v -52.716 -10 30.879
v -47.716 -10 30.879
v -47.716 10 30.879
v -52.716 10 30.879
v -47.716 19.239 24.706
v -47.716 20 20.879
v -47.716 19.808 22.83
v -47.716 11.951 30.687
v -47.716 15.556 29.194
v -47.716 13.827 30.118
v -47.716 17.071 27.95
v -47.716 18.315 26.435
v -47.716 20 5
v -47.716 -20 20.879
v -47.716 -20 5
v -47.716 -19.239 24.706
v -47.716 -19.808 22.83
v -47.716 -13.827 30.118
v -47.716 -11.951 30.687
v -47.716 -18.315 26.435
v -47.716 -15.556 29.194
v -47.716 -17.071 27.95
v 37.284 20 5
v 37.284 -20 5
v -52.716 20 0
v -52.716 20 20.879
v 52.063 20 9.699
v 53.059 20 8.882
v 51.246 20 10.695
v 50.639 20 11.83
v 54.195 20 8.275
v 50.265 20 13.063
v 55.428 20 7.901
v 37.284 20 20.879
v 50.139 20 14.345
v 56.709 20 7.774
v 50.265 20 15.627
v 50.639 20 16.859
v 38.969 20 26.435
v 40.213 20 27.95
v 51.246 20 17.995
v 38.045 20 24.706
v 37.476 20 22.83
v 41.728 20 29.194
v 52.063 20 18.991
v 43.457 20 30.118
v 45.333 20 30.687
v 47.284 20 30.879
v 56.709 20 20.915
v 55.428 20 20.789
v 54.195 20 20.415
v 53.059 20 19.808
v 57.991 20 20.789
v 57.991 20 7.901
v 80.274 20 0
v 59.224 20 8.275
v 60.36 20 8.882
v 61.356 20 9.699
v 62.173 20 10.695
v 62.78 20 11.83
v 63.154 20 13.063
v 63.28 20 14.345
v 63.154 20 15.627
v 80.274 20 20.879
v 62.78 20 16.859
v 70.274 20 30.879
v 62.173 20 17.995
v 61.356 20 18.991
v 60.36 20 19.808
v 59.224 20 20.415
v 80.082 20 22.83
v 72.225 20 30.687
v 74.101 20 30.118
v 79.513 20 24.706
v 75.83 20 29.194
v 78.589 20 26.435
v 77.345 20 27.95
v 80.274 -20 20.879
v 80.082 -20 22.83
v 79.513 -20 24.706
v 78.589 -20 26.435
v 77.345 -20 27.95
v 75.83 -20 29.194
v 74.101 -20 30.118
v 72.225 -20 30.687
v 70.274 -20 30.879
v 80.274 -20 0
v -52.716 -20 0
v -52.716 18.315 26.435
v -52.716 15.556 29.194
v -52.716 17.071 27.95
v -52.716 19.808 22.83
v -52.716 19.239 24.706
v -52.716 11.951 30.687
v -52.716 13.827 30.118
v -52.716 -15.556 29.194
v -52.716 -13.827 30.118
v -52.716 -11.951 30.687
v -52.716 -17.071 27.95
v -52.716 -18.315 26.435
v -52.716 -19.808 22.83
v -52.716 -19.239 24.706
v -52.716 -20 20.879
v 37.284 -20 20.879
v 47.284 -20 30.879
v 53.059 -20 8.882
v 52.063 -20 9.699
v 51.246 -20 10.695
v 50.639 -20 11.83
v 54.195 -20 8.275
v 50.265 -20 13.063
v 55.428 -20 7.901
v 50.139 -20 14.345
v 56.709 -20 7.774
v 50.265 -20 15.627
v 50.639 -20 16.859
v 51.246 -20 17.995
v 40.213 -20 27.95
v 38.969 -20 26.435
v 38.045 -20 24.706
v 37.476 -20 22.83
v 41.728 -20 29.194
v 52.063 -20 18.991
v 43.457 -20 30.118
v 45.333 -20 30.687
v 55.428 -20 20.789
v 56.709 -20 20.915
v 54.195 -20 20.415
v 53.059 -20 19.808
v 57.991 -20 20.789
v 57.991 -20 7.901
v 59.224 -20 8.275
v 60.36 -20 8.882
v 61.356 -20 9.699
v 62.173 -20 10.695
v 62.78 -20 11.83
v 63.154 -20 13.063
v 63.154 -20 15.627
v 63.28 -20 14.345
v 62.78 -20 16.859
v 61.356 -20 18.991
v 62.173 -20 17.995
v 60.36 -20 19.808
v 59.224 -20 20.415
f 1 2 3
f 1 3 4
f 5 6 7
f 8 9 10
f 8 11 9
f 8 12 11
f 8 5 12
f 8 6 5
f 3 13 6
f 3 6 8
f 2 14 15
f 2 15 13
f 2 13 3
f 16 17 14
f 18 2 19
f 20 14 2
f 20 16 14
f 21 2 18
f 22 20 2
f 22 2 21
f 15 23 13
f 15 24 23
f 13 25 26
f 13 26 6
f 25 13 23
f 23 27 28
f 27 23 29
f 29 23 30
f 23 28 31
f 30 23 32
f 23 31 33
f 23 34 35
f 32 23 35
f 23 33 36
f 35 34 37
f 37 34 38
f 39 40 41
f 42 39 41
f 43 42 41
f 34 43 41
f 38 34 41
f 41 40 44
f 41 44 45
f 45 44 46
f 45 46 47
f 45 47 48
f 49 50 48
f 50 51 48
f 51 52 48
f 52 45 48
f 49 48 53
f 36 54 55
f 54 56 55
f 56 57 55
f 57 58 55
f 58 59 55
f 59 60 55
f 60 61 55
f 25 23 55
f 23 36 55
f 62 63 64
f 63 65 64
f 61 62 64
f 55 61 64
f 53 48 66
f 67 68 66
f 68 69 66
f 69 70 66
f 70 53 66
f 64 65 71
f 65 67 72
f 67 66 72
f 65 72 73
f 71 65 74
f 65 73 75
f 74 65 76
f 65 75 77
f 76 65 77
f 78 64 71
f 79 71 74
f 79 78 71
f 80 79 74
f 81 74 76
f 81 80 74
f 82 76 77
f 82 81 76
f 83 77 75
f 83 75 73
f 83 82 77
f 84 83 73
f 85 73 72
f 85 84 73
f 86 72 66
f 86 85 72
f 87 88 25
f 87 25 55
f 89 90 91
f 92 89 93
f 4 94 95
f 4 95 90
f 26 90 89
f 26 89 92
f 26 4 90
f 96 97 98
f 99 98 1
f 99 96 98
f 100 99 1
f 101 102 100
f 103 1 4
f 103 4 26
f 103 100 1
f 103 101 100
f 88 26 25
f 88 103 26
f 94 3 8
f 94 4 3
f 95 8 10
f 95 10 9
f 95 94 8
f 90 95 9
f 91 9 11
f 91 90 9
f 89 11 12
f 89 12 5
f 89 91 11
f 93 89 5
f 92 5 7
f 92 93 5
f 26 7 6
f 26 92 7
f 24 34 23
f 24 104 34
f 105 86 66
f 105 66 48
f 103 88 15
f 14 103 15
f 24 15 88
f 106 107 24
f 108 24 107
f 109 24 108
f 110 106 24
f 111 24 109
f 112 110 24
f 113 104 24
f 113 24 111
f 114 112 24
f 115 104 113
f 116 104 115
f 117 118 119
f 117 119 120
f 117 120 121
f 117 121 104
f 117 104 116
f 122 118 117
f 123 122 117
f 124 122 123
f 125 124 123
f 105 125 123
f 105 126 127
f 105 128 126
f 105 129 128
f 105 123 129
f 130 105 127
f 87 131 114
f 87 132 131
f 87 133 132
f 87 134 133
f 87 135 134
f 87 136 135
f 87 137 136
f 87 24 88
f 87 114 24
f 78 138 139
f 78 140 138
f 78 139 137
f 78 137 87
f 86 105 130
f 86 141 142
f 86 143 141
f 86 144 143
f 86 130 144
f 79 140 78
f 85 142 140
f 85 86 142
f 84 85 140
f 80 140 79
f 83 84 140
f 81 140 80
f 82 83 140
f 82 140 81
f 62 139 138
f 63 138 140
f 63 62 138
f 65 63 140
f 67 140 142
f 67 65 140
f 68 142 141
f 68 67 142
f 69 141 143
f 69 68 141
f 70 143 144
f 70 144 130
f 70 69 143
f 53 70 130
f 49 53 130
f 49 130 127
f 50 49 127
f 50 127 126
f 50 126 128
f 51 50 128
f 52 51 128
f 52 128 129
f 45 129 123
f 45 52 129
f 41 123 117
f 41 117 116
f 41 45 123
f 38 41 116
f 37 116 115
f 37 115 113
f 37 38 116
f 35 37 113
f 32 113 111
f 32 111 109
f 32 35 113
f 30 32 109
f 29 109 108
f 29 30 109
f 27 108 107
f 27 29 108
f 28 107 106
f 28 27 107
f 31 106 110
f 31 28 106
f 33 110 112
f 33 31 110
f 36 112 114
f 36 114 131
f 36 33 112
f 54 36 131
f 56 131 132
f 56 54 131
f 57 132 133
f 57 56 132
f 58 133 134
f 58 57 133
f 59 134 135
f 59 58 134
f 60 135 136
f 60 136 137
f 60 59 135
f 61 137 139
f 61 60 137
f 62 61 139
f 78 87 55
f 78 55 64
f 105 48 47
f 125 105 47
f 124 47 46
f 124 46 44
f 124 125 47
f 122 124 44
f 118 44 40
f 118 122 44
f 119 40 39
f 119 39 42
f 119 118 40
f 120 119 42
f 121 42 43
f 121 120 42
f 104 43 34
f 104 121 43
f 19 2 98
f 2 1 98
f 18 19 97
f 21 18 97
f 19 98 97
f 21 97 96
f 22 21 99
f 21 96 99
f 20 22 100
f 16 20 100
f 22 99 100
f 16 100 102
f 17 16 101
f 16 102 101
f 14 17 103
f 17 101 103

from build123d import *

# Parameters (mm, degrees)
F0_R     = 6.570466
F1_DEPTH = 20
F2_R     = 10
F3_R     = 10


with BuildPart() as f1:
    # F0 (on Front) → F1 (new body, symmetric)
    with BuildSketch(Plane.XZ):
        Polygon((-52.715916, 30.87929), (-52.715916, 0), (37.284084, 0), (37.284084, 5), (-47.715916, 5), (-47.715916, 30.87929), align=None)
        with BuildLine():
            Line((37.284084, 5), (37.284084, 0))
            Line((37.284084, 0), (80.273889, 0))
            Line((80.273889, 0), (80.273889, 20.87929))
            ThreePointArc((80.273889, 20.87929), (77.344957, 27.950358), (70.273889, 30.87929))
            Line((70.273889, 30.87929), (47.284084, 30.87929))
            ThreePointArc((47.284084, 30.87929), (40.213016, 27.950358), (37.284084, 20.87929))
            Line((37.284084, 20.87929), (37.284084, 5))
        make_face()
        with Locations((56.709491, 14.344878)):
            Circle(F0_R, mode=Mode.SUBTRACT)
    extrude(amount=F1_DEPTH, both=True)

    # F2
    f2_edges = [f1.edges().sort_by_distance(p)[0] for p in [
        (-50.215916, 20, 30.87929),
    ]]
    fillet(f2_edges, radius=F2_R)

    # F3
    f3_edges = [f1.edges().sort_by_distance(p)[0] for p in [
        (-50.215916, -20, 30.87929),
    ]]
    fillet(f3_edges, radius=F3_R)


solid = f1.part
